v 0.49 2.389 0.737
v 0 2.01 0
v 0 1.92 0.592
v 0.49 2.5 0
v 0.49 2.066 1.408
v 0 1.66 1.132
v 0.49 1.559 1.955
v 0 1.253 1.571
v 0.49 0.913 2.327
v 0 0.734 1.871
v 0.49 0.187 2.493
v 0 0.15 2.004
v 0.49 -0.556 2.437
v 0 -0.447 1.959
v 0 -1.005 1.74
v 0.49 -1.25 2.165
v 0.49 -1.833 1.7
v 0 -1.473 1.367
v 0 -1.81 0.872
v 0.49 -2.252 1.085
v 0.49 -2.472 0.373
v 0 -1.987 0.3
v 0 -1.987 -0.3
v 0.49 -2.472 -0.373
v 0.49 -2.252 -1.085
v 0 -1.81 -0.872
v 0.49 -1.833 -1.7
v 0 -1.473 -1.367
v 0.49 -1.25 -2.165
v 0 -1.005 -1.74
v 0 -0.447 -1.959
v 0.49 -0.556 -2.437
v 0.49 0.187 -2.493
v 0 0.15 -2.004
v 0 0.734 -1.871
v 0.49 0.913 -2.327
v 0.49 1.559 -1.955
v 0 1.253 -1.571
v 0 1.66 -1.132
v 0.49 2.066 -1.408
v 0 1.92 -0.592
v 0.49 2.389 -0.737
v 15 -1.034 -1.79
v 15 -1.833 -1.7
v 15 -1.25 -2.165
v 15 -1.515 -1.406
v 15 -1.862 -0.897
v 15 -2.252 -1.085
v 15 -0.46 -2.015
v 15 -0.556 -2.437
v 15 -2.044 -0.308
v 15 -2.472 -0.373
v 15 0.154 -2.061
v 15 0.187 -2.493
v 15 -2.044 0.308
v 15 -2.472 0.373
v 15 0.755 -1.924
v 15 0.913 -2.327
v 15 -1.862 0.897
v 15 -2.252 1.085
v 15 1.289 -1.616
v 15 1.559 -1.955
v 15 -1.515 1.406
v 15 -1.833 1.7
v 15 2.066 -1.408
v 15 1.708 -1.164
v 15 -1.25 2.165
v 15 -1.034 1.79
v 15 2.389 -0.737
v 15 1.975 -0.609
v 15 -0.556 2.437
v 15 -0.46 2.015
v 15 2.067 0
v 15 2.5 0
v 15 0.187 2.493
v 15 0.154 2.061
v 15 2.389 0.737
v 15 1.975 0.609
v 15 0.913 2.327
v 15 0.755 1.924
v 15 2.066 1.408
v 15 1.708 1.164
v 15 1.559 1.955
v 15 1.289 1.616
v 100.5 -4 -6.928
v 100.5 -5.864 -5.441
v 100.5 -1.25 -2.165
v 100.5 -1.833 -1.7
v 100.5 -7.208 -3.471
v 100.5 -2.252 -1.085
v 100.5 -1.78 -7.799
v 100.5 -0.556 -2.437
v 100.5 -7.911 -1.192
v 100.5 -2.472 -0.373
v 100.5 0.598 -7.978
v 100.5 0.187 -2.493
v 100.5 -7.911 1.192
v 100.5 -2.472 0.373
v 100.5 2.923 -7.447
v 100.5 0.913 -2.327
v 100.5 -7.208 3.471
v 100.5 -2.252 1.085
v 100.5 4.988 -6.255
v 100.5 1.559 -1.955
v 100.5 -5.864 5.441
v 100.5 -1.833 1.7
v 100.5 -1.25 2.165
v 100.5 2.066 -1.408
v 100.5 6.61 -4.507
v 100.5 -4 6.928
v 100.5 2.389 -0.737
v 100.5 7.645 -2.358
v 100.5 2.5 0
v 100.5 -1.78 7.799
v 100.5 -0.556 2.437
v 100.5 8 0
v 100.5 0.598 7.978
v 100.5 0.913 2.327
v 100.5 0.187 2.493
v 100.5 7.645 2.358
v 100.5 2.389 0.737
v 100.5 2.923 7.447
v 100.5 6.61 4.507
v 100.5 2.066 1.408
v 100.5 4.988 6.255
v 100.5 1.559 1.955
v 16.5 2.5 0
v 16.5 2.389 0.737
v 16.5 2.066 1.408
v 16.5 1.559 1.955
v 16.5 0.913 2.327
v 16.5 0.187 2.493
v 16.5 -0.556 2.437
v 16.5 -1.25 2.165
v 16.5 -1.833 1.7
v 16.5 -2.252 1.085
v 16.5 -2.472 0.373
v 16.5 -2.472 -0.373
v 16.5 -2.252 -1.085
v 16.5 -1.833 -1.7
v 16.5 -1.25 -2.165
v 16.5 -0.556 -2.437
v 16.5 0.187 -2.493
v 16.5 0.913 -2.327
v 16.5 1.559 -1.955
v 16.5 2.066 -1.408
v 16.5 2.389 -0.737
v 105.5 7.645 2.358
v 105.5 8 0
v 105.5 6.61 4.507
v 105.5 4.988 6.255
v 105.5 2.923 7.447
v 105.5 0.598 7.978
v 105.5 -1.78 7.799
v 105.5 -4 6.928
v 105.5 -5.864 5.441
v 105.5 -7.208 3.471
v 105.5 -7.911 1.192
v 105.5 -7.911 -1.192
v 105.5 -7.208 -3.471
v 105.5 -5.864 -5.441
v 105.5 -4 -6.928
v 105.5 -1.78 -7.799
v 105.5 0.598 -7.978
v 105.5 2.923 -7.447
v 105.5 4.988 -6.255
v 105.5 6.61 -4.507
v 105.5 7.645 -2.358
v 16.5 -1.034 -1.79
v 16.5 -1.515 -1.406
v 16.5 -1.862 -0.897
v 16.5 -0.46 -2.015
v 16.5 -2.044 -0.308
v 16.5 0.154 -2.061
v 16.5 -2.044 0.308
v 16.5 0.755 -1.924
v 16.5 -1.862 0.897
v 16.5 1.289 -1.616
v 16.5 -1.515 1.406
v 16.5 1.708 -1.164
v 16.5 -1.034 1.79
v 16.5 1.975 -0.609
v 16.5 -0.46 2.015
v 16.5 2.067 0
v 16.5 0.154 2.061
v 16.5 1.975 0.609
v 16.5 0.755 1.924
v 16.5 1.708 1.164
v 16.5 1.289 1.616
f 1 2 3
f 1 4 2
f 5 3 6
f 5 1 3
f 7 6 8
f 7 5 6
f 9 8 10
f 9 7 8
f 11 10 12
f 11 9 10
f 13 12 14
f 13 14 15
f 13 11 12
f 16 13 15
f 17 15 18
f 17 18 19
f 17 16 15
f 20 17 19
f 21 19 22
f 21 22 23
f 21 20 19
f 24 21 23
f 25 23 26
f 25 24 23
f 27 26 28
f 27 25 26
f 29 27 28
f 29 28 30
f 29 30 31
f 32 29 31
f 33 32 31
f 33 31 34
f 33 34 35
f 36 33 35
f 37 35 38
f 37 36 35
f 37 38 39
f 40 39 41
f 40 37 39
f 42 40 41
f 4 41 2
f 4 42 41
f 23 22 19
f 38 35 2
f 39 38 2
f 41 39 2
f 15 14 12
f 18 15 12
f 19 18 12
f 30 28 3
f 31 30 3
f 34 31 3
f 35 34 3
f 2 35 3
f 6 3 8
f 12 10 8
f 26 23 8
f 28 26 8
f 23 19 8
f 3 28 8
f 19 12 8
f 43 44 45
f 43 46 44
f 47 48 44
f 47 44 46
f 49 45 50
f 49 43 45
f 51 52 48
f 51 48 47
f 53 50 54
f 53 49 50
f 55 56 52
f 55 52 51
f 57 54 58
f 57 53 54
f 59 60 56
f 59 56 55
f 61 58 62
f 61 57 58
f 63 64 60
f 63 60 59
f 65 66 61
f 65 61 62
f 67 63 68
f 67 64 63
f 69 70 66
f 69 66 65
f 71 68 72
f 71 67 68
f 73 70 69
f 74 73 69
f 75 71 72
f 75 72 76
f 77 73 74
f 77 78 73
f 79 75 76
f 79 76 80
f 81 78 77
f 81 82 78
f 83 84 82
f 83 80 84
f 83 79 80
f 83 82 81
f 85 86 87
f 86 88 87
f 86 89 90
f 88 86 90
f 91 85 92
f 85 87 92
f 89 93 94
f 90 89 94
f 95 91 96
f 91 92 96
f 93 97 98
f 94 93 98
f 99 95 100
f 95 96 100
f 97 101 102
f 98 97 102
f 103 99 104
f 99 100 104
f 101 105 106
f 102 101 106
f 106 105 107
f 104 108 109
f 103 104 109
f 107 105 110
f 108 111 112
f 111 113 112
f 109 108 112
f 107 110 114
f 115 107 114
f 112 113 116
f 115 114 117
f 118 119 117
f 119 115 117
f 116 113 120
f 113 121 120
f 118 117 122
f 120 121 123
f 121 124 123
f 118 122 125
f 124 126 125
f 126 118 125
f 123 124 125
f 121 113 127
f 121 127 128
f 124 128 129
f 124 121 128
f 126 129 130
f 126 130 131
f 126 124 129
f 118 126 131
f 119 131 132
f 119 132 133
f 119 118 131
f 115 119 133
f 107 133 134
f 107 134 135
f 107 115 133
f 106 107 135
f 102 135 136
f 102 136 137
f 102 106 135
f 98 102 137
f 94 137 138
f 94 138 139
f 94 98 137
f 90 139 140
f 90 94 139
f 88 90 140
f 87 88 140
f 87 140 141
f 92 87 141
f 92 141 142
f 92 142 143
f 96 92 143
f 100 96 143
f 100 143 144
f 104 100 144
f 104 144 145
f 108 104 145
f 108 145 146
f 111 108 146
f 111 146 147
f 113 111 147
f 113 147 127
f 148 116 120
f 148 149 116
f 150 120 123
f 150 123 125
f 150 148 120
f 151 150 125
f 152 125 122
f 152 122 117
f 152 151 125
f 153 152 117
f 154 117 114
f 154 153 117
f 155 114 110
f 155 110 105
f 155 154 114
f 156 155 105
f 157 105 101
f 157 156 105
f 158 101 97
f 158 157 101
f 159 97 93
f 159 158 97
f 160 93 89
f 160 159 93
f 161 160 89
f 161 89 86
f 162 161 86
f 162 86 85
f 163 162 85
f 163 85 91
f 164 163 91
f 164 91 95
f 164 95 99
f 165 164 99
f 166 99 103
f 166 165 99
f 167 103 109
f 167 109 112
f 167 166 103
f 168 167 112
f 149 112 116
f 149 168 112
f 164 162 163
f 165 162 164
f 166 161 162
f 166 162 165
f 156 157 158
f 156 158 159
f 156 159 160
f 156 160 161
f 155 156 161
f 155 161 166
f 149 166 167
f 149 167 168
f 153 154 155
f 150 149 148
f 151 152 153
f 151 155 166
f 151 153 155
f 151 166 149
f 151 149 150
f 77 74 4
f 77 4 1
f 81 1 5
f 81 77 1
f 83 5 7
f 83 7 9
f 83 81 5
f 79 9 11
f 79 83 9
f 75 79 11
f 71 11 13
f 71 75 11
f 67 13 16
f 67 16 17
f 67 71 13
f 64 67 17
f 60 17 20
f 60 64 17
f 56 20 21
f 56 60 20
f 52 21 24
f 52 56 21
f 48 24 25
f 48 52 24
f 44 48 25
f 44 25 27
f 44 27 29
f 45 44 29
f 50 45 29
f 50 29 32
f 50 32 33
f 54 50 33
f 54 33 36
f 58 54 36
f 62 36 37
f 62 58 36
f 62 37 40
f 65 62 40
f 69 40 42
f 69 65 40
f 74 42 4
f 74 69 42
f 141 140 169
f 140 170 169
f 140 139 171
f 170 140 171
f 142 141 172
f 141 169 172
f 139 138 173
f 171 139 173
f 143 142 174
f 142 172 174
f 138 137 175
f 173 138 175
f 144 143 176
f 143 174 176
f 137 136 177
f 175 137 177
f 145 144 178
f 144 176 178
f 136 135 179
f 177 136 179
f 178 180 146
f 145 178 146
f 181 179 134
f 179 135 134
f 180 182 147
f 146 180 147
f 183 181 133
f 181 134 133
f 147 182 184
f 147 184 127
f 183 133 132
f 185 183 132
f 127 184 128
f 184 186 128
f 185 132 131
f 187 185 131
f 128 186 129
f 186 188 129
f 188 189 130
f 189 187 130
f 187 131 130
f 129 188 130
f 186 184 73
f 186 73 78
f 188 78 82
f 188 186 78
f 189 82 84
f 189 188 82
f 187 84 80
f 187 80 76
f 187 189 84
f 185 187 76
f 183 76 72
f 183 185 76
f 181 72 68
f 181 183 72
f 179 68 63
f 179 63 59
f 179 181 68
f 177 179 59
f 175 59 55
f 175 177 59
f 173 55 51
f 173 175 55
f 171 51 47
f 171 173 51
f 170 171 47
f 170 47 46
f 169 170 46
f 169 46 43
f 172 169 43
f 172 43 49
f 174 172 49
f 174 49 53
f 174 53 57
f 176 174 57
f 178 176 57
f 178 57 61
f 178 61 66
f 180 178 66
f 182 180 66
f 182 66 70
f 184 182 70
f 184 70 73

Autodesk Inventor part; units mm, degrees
sketch "Sketch_5" plane through (0, 0, 0) normal (0, 0, 1) x (1, 0, 0)
  line L0 (105.5, 0) -> (0, 0)
  line L1 (0, 0) -> (0, 2.0095)
  line L2 (0, 2.0095) -> (0.4905, 2.5)
  line L3 (0.4905, 2.5) -> (15, 2.5)
  line L4 (15, 2.5) -> (15, 2.067)
  line L5 (15, 2.067) -> (16.5, 2.067)
  line L6 (16.5, 2.067) -> (16.5, 2.5)
  line L7 (16.5, 2.5) -> (100.5, 2.5)
  line L8 (100.5, 2.5) -> (100.5, 8)
  line L9 (100.5, 8) -> (105.5, 8)
  line L10 (105.5, 8) -> (105.5, 0)
  line L11 (105.5, 0) -> (0, 0)
revolve "Revolution1" add sketch "Sketch_5" angle 360 about axis through (105.5, 0, 0) along (1, 0, 0)
thread "Thread1" size "M5x0.8" class "6g" standard "ISO Metric profile" full length
ref_plane "ROD_BA_XY" through (10, 0, 0) normal (-1, 0, 0) x (0, 0, -1)
ref_plane "ROD_BA_YZ" through (10, 0, 0) normal (0, 0, -1) x (0, -1, 0)
ref_plane "ROD_BA_ZX" through (10, 0, 0) normal (0, -1, 0) x (-1, 0, 0)
ref_plane "ROD_BODY_XY" through (28, 0, 0) normal (-1, 0, 0) x (0, 0, -1)
ref_plane "ROD_BODY_YZ" through (28, 0, 0) normal (0, 0, -1) x (0, -1, 0)
ref_plane "ROD_BODY_ZX" through (28, 0, 0) normal (0, -1, 0) x (-1, 0, 0)
ref_plane "rodnt1_XY" through (7.5, 0, 0) normal (1, 0, 0) x (0, 0, -1)
ref_plane "rodnt1_YZ" through (7.5, 0, 0) normal (0, 0, -1) x (0, 1, 0)
ref_plane "rodnt1_ZX" through (7.5, 0, 0) normal (0, 1, 0) x (1, 0, 0)
properties part number "CJ2B16-60Z_ROD" material "ステンレス鋼"
